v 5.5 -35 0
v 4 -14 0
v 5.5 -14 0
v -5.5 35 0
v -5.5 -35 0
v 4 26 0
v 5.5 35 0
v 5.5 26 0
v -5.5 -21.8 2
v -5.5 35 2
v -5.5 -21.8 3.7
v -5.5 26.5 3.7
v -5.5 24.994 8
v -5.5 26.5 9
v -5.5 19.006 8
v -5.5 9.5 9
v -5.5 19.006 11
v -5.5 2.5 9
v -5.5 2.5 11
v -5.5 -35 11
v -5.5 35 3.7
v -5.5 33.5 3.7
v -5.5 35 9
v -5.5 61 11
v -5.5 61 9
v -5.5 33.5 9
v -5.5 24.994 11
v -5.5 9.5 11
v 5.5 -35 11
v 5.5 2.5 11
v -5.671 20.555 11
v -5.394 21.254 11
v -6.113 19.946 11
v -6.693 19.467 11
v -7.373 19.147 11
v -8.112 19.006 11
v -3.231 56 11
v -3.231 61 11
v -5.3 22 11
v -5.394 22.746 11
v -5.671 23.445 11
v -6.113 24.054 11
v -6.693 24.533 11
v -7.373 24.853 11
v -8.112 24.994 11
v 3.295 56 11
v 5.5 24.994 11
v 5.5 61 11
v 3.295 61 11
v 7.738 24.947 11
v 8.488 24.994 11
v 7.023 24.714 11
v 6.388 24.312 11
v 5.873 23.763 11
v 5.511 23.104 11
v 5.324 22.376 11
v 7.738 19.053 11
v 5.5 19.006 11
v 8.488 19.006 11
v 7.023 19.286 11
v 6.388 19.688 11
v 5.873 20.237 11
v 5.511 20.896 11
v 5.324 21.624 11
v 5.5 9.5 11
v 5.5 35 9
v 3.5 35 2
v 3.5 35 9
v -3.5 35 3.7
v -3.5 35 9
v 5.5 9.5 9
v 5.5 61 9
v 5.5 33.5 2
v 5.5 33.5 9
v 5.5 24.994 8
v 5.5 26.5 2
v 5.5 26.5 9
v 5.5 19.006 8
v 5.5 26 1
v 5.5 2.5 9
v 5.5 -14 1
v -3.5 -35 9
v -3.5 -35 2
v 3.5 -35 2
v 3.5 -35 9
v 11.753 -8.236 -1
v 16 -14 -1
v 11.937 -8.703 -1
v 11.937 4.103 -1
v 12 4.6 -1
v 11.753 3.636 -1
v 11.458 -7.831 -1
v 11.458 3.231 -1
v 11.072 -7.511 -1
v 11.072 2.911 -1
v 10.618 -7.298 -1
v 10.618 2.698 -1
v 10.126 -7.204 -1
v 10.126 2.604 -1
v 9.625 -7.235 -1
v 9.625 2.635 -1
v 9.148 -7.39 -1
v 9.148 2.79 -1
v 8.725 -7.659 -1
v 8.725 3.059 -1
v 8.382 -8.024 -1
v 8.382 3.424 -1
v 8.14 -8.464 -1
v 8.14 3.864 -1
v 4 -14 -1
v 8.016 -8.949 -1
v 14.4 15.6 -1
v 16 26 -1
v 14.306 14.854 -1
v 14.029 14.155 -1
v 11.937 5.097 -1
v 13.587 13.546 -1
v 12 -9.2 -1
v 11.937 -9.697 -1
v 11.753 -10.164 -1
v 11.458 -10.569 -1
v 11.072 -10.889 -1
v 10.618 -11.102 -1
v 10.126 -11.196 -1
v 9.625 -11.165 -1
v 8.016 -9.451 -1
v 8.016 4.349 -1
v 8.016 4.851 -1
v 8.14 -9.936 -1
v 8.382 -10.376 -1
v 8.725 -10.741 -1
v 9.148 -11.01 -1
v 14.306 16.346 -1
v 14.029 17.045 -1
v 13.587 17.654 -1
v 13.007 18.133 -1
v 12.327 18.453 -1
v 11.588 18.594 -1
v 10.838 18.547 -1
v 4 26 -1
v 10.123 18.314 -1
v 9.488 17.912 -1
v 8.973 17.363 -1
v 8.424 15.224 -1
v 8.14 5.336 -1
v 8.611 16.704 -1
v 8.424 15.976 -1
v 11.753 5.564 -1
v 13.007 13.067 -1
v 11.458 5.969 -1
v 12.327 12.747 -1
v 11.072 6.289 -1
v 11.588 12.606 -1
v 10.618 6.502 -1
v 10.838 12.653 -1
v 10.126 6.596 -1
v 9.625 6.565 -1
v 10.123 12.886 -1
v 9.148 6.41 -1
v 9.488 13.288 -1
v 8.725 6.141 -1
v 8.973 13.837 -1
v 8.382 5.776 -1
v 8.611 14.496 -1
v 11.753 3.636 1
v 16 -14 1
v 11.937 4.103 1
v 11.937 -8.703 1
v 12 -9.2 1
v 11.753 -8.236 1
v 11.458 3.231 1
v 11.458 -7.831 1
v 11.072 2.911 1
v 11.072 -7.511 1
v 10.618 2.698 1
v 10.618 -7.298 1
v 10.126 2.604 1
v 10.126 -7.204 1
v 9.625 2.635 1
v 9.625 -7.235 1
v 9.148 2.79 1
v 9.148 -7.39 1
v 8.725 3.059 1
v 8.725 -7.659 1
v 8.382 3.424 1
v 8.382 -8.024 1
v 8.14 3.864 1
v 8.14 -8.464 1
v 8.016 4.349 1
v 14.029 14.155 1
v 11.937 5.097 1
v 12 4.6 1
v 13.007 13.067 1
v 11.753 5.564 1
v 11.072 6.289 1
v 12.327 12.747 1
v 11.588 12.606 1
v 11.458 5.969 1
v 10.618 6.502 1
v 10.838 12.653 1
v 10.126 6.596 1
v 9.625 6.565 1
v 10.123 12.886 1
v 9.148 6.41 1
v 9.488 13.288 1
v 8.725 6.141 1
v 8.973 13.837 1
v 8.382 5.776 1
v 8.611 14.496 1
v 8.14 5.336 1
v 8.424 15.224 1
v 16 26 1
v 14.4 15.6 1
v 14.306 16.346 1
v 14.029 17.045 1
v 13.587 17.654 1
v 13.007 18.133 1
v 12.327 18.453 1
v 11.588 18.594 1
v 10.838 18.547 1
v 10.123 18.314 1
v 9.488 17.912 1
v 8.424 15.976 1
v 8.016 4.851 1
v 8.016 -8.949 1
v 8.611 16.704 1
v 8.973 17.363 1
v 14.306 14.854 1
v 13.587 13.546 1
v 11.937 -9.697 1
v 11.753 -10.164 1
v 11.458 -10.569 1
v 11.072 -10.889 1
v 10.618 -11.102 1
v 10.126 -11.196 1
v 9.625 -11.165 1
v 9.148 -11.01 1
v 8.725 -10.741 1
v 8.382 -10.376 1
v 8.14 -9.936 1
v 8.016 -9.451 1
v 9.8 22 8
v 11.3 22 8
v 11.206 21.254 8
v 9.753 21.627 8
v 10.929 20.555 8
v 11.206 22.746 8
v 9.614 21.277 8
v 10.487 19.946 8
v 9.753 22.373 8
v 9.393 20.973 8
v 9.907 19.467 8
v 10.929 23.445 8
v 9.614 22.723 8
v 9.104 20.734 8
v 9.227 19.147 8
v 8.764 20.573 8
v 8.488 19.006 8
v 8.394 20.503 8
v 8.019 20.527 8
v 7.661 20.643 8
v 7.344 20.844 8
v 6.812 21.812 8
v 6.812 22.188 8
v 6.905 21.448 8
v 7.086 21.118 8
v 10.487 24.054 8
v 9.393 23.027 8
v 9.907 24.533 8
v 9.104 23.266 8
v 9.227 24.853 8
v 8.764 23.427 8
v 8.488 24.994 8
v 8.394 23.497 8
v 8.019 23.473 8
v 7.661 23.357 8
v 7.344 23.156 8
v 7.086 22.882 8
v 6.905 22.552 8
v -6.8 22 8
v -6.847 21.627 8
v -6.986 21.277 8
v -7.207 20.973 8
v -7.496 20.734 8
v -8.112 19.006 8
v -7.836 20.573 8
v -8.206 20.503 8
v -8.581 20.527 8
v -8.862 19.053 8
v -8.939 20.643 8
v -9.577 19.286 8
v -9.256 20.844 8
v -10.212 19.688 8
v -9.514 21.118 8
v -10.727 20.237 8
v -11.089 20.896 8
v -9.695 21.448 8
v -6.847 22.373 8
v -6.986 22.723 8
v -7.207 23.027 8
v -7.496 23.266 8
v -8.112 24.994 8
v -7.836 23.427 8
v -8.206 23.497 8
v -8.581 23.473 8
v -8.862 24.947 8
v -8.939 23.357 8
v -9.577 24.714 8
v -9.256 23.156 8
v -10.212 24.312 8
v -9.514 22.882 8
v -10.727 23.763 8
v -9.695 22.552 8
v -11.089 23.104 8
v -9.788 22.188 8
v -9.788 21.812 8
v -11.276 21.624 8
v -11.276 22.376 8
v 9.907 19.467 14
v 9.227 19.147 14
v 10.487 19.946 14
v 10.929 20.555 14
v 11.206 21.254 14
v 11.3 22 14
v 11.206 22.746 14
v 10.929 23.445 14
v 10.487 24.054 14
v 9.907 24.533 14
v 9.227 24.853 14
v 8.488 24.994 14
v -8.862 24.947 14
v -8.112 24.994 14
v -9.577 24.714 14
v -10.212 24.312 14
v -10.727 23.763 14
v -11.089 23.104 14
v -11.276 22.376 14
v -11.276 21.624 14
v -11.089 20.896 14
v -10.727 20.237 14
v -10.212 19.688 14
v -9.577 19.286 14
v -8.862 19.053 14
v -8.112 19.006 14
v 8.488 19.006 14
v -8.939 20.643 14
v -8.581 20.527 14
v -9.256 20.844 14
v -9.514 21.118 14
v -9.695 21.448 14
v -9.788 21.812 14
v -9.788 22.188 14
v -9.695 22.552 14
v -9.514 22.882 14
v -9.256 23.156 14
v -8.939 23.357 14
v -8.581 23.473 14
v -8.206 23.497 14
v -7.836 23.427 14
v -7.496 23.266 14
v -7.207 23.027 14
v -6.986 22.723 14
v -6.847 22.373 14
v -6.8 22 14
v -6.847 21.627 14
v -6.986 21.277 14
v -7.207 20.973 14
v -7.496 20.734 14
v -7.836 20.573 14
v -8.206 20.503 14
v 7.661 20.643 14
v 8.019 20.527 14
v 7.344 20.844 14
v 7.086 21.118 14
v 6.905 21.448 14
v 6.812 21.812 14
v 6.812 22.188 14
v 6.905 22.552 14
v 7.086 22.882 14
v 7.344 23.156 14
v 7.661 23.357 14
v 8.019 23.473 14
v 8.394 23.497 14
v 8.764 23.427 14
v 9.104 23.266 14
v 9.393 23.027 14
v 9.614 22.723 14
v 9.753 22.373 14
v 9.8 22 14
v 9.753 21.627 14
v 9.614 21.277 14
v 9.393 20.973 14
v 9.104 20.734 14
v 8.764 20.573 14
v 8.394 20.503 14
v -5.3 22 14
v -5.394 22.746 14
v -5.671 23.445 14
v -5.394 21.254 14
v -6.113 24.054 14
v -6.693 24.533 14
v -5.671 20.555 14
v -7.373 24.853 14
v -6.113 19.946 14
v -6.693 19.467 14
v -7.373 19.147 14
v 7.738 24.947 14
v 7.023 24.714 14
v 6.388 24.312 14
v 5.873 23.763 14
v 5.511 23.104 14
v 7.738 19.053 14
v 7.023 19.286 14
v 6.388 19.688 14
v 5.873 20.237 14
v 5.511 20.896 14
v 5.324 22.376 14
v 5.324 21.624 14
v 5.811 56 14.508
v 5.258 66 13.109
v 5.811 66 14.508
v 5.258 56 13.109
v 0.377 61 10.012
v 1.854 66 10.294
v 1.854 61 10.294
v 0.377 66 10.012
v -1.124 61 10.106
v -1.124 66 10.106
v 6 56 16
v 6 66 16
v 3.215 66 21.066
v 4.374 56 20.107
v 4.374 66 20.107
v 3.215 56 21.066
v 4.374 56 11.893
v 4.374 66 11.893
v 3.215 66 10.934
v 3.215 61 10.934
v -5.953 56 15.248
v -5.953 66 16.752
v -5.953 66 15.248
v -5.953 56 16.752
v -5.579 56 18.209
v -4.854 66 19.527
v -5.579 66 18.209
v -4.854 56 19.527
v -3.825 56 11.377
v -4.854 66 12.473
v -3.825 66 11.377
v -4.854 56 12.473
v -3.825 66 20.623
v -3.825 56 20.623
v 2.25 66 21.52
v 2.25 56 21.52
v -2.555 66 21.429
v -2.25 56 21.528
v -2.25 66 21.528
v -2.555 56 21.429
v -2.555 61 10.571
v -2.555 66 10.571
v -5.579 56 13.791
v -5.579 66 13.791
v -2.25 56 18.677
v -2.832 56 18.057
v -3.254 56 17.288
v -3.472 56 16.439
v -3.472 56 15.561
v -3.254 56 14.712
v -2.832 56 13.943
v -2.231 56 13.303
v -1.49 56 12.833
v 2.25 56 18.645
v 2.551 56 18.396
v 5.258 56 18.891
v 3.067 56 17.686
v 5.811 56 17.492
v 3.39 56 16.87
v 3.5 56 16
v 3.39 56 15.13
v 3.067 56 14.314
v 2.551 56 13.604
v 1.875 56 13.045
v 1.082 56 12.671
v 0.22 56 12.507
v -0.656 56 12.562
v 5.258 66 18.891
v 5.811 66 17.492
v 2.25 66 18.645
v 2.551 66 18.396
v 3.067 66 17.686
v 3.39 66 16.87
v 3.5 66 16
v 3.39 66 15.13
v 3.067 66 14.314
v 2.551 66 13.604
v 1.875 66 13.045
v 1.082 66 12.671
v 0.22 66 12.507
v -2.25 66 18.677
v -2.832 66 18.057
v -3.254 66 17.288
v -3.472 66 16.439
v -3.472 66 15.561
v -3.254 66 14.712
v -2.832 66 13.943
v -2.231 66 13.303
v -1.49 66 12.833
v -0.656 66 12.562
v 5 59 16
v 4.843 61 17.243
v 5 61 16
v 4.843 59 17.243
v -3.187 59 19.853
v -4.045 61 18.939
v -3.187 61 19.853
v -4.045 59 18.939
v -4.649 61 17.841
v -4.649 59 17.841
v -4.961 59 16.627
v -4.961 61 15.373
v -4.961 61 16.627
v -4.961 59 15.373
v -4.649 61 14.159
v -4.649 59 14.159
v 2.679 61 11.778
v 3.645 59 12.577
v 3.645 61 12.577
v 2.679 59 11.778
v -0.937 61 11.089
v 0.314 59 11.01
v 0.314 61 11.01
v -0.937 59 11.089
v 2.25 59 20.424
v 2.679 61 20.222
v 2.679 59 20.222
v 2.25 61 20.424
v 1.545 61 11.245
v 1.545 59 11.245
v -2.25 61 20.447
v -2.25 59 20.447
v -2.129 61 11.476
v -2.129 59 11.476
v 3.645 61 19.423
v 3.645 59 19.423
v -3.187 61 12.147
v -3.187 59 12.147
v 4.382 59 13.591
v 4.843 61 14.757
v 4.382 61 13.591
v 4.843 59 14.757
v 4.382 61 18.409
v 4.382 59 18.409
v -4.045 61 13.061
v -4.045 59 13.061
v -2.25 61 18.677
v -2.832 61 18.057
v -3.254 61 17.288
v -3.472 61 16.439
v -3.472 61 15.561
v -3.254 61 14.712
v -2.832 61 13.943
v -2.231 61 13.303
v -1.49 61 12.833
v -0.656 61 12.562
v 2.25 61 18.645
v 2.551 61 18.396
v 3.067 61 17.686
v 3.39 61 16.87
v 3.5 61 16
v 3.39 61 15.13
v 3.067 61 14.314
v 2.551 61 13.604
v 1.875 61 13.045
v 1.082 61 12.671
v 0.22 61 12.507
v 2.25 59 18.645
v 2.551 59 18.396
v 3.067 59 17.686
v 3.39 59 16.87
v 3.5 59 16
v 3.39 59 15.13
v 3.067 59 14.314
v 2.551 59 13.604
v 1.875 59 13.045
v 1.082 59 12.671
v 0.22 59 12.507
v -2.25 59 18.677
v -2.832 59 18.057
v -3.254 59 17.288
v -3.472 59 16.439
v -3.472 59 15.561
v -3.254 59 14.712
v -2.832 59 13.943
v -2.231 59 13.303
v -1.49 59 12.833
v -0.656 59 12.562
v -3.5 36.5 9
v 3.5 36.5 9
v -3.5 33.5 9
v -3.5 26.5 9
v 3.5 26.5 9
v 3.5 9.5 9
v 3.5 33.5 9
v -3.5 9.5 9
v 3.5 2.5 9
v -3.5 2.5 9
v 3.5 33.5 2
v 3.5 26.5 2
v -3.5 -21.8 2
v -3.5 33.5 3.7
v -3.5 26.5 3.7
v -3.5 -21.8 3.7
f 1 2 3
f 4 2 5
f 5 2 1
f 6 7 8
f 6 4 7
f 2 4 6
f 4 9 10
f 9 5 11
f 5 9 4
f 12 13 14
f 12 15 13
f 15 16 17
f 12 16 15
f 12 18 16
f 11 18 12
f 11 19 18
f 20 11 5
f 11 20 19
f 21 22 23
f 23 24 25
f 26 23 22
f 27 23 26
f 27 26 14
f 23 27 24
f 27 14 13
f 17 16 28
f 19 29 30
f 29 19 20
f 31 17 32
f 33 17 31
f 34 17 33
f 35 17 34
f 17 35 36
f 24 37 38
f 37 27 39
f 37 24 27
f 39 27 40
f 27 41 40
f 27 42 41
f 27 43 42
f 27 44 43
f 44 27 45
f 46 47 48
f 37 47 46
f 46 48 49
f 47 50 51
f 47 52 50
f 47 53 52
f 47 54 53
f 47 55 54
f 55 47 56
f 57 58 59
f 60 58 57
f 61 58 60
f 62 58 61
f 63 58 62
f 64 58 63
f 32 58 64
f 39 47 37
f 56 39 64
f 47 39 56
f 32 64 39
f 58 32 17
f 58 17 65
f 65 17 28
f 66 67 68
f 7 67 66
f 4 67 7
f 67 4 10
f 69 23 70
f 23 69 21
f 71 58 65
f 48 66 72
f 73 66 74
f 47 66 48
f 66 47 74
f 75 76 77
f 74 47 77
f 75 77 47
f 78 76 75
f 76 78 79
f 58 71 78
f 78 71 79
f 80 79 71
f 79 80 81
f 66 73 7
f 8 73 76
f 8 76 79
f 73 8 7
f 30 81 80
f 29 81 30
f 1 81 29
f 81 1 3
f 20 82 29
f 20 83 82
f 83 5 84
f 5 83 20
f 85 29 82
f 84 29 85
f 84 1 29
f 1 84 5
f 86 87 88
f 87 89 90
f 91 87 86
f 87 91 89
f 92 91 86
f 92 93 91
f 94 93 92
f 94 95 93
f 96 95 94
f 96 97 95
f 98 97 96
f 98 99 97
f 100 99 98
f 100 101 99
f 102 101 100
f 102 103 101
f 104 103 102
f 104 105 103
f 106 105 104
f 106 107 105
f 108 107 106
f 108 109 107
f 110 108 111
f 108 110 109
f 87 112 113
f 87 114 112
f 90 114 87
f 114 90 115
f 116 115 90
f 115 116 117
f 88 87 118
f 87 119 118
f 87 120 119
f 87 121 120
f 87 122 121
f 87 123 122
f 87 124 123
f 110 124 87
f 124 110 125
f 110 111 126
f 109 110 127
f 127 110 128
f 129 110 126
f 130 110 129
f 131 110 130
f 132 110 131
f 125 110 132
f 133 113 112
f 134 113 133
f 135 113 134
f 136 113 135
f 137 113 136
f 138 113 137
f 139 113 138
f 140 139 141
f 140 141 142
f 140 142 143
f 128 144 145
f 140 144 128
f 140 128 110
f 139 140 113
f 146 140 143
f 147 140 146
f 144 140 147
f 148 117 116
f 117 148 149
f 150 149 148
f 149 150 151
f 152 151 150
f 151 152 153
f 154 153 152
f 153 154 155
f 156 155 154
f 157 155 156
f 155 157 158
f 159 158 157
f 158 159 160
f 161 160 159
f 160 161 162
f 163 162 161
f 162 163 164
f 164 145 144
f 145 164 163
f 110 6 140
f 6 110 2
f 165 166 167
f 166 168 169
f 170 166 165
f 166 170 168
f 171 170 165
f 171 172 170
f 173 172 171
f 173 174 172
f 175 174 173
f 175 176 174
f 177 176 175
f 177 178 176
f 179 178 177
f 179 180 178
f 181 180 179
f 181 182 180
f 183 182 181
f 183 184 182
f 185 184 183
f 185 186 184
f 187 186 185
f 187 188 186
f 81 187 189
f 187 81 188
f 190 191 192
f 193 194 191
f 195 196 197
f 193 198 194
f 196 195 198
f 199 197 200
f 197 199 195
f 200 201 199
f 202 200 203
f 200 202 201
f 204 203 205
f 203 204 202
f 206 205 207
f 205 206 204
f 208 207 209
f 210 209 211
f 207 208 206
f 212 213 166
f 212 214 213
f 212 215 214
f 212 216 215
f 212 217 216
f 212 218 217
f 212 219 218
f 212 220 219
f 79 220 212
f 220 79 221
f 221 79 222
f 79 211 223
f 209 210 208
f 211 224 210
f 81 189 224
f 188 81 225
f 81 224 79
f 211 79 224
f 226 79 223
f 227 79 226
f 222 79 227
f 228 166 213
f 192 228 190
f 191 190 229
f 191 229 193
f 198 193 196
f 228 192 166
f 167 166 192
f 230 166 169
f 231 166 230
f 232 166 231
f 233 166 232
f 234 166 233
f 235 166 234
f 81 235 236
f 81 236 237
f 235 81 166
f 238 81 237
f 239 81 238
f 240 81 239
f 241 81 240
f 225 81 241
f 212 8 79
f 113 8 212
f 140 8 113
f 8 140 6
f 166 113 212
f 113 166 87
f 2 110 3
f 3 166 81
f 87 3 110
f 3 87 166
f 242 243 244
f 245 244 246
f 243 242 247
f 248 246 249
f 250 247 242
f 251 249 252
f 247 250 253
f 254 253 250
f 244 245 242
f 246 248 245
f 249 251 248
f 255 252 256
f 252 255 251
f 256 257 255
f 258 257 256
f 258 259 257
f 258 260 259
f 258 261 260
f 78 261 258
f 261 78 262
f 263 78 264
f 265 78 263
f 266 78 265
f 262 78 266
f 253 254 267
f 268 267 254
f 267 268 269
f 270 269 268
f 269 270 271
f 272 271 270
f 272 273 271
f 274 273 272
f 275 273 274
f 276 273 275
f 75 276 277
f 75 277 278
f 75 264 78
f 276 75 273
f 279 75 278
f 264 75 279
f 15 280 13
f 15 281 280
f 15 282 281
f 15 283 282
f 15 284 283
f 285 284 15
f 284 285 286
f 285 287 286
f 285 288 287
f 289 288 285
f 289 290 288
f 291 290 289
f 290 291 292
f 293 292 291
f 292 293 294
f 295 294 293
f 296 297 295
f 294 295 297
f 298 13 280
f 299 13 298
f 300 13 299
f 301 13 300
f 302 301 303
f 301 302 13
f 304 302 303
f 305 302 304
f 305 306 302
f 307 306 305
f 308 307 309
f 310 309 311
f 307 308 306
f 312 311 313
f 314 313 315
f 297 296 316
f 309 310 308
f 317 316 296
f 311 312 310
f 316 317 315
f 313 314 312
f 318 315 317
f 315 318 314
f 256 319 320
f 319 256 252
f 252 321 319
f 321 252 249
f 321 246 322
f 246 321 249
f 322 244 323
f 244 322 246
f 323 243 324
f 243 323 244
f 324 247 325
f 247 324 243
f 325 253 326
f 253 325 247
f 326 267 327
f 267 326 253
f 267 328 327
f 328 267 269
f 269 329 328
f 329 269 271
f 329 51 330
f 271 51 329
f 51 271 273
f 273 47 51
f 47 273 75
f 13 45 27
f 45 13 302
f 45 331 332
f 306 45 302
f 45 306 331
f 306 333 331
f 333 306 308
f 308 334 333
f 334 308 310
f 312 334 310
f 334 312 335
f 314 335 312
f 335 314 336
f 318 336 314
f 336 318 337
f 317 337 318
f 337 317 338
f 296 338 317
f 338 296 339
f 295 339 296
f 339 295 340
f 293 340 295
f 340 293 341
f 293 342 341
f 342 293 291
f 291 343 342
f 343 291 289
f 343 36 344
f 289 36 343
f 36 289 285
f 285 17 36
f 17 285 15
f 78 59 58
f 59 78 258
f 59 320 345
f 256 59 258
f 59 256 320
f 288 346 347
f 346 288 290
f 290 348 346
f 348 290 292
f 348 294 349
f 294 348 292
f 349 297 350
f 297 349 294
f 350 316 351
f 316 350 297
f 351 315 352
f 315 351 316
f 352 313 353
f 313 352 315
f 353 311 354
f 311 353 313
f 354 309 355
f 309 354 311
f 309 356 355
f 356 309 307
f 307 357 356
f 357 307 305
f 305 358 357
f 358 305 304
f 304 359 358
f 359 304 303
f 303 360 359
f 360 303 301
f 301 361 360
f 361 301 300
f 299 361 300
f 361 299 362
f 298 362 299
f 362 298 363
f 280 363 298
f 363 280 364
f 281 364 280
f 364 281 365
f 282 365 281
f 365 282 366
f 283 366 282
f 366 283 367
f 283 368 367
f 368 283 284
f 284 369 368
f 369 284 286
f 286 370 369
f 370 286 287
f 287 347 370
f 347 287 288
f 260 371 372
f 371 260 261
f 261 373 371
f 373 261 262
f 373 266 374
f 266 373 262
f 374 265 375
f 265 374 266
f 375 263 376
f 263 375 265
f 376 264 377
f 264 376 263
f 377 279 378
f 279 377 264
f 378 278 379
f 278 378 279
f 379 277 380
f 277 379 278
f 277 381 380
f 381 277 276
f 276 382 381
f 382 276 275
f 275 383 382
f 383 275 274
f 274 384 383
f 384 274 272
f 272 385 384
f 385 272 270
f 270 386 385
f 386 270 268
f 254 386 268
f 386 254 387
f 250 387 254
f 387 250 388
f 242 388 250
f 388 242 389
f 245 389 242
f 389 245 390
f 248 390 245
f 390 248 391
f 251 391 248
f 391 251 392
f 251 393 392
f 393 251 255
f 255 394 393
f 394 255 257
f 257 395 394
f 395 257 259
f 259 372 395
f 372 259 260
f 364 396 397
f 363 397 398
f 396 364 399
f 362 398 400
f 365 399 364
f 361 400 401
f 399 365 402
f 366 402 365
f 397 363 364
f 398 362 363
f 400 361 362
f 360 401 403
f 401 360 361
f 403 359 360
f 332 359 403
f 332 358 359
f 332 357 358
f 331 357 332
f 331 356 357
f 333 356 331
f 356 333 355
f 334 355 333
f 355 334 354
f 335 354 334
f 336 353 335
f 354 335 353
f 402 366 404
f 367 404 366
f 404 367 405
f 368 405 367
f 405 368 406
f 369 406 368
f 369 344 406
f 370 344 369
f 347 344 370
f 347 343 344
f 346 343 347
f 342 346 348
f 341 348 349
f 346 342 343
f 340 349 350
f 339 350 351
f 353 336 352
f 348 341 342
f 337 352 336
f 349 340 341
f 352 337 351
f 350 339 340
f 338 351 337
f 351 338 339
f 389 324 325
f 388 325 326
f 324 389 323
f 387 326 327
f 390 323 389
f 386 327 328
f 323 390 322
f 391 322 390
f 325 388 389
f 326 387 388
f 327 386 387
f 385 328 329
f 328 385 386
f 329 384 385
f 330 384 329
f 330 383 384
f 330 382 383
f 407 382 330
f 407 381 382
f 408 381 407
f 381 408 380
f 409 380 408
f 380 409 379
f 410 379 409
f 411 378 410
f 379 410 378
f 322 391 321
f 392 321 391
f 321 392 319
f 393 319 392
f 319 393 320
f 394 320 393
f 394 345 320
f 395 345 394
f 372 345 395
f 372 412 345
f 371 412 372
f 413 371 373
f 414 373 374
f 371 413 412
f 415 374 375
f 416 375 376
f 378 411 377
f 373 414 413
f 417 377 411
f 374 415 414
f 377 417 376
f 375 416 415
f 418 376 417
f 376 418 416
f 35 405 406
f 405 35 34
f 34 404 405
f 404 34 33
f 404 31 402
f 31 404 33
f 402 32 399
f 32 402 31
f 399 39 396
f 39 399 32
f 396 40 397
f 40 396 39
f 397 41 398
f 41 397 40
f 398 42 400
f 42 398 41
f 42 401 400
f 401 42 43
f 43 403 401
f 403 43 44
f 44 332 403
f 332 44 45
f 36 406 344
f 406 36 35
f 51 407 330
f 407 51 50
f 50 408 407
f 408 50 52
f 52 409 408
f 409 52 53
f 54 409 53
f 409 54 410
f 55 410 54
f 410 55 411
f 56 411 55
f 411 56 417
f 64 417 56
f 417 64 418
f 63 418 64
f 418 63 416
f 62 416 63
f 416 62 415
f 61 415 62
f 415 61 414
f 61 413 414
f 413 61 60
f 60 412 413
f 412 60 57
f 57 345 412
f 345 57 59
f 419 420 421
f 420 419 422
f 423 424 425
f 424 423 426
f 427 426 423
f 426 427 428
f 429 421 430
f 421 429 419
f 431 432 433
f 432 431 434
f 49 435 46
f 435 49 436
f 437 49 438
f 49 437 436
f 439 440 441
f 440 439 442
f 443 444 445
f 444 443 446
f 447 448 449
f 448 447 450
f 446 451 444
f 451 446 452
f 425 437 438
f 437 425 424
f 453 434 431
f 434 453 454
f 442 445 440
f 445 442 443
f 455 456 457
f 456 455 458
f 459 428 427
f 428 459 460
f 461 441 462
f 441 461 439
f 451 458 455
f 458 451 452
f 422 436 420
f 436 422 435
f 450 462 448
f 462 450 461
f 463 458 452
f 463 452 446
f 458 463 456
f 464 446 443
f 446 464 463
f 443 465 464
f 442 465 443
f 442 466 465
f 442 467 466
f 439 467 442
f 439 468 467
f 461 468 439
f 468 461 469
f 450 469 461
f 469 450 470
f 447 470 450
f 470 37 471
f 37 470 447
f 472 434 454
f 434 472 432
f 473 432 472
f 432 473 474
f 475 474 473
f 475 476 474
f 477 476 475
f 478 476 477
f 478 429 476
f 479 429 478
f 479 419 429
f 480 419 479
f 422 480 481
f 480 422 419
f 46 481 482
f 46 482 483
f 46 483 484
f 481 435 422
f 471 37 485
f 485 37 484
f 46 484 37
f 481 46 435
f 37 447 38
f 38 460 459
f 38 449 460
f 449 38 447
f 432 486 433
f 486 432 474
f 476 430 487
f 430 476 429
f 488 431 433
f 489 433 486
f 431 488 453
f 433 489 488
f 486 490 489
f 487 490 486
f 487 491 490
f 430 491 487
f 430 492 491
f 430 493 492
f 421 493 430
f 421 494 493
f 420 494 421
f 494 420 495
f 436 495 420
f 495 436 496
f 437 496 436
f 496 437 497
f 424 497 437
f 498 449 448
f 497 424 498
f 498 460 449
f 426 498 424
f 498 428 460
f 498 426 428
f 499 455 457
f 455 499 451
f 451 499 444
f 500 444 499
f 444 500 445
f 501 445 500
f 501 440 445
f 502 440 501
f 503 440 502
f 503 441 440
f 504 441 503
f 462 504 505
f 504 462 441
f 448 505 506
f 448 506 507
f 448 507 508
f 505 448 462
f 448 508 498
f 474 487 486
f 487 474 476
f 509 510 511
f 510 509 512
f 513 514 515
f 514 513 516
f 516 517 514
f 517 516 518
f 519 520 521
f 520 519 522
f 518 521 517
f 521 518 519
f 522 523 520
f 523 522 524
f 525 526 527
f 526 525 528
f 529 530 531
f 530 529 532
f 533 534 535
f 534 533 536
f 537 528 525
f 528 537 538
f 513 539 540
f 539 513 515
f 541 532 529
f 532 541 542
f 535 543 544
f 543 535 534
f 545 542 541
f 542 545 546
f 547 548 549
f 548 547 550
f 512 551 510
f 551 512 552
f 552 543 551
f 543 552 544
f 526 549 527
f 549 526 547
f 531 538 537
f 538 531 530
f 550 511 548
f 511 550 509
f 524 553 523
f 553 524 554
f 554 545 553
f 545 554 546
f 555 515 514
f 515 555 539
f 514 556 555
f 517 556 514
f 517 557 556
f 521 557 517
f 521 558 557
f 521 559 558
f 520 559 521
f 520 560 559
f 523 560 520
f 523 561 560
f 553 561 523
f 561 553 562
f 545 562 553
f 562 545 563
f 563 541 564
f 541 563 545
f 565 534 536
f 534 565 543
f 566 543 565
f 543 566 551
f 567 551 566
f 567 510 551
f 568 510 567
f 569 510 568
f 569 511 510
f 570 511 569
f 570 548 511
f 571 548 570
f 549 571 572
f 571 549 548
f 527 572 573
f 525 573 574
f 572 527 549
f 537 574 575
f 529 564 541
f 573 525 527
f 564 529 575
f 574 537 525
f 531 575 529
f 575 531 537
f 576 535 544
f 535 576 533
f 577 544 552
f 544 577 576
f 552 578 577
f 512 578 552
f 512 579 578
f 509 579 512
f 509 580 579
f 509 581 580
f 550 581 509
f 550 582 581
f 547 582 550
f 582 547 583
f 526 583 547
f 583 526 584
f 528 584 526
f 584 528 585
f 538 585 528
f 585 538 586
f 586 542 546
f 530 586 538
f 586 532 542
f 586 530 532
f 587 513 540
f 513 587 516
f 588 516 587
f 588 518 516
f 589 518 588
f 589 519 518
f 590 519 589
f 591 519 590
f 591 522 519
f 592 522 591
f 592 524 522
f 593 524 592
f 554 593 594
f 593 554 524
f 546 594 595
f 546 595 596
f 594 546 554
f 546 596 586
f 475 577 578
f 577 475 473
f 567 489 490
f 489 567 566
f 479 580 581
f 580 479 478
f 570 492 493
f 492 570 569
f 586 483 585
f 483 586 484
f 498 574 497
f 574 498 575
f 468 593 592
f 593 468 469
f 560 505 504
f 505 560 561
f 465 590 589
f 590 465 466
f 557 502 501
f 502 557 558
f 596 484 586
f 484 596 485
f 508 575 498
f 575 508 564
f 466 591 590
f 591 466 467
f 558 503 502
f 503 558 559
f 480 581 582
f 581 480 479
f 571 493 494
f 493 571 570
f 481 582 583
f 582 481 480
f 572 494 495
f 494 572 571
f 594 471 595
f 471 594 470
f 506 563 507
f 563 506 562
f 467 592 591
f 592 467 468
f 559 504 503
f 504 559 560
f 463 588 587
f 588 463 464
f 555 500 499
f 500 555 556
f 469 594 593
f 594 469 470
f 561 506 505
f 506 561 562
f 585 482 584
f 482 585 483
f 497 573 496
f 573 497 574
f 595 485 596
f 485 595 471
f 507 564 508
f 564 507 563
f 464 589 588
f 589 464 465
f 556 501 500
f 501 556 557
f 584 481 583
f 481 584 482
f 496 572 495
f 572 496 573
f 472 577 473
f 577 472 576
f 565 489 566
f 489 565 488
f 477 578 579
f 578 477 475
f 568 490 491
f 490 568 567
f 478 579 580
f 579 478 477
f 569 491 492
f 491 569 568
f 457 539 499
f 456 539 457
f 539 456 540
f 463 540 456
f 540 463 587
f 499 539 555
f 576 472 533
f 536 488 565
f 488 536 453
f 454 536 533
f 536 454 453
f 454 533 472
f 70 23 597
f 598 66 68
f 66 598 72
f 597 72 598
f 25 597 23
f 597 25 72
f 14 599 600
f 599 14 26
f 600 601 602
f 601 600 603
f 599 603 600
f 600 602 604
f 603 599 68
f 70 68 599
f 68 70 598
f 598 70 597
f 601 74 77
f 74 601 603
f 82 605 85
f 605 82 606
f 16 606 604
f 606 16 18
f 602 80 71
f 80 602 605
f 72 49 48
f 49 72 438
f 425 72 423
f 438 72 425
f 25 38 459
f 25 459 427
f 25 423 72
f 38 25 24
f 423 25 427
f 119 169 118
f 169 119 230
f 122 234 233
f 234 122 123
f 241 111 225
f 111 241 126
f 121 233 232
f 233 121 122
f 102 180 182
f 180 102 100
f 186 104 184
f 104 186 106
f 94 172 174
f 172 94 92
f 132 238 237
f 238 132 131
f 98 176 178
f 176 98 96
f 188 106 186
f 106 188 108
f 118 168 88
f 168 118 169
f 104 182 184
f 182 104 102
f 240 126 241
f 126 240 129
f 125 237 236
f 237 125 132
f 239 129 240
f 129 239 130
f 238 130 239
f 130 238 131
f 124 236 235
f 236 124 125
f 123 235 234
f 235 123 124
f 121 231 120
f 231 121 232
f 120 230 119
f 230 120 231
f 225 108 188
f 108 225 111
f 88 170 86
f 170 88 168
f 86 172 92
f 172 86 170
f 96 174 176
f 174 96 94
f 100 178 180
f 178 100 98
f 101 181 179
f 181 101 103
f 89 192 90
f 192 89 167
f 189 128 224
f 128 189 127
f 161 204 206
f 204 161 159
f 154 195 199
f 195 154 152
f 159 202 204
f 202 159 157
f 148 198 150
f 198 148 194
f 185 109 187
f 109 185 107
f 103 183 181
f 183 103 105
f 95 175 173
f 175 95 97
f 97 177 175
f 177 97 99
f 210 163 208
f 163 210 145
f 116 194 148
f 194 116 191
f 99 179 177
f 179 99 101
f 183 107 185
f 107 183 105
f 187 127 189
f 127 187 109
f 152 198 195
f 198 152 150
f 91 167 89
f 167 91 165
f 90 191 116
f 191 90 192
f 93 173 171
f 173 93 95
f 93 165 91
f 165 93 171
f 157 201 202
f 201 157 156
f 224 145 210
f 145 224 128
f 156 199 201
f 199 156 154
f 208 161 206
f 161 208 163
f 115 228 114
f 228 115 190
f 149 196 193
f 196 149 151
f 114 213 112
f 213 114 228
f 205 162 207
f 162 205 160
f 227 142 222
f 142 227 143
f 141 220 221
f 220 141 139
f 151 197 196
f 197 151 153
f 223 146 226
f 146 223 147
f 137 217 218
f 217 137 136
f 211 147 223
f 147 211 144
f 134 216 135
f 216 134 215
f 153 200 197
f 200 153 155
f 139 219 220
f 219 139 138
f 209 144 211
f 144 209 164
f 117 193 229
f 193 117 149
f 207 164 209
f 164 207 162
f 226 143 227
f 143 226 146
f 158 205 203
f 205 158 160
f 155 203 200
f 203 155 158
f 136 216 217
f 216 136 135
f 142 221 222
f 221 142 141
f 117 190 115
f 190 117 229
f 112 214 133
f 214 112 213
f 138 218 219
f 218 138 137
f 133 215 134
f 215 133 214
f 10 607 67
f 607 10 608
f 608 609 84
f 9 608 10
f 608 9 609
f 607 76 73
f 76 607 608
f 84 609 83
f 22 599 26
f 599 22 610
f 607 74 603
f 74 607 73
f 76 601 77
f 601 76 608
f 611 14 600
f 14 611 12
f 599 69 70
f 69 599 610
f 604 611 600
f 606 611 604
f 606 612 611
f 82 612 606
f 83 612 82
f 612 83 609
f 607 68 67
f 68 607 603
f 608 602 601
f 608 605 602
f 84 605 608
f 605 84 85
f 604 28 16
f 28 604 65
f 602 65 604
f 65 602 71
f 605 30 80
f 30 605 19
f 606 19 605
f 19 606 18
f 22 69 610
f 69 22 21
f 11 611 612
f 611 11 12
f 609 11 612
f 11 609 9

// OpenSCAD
$fn = 25;

wall_thickness = 2;

body_width = 11;
body_depth = 70;
body_height = 11;

big_cut_width = 11;
big_cut_depth = 7;
big_cut_height = wall_thickness;
big_cut_position_depth = 19;
big_cut_position_height = body_height - wall_thickness;

long_cut_width = 7;
long_cut_height = 7;
long_cut_depth = body_depth;

h_cut_size = [body_width+20, 7, 7];
h_cut_pos = [0, body_depth - 40, wall_thickness];

v_cut_size = [7, body_depth + 3, 7];
v_cut_pos = [0, 0, wall_thickness];

sensor_cut_size = [11.1, 7, wall_thickness + 0.1];
sensor_cut_pos = [0, body_depth - 64, body_height - wall_thickness];

suv_cut_size = [wall_thickness + 0.2, body_depth - 3, 1.7];
suv_cut_pos = [-(body_width - wall_thickness)/2, body_depth - 58.3, wall_thickness];

plate_pos = [0, body_depth - 49, 8];

holes = [
     [2, 15, [10, body_depth - 79.2, -5]],
     [2, 15, [10, body_depth - 65.4, -5]],
     [3, 15, [11.4, body_depth - 54.4, -5]],
];

mount_plate_size = [12, 40, wall_thickness];
mount_plate_pos = [10, body_depth - 64, -1];

cabel_plate_size = [body_width, 40, wall_thickness];
cabel_plate_pos = [0, plate_pos.y + cabel_plate_size.y/2, body_height - wall_thickness];

cabel_ring_size = [3.5, 5, 2, 10, 6];
cabel_ring_pos = [0, plate_pos.y + cabel_plate_size.y, body_height - wall_thickness/2 + cabel_ring_size[4]];

cabel_cut_size = 4.5;

module cut(cut_size) {
     linear_extrude(height=cut_size.z)
          square([cut_size.x, cut_size.y], center=true);
};

module body() {
     linear_extrude(height=body_height)
          square([body_width, body_depth], center=true);

     translate(mount_plate_pos)
          linear_extrude(height=mount_plate_size.z)
          square([mount_plate_size.x, mount_plate_size.y], center=true);

};


module cabel_ring() {
     rotate([90, 0, 0])
     translate([0, 0, -cabel_ring_size[3]/2])
     difference() {
          linear_extrude(height=cabel_ring_size[3])
               circle(cabel_ring_size[4], center=true);

          translate([0, 0, cabel_ring_size[3]/2])
               linear_extrude(height=cabel_ring_size[2])
               circle(cabel_ring_size.y, center=true);

          translate([0, 0, -0.1])
               linear_extrude(height=cabel_ring_size[3] + 0.2)
               circle(cabel_ring_size.x, center=true);

          translate([0, (cabel_ring_size.x + cabel_ring_size[4])/2, -2])
               linear_extrude(height=cabel_ring_size[3] + 3)
               square([cabel_cut_size, cabel_ring_size[4] - cabel_ring_size.x + 2], center=true);
     };

};

module cabel() {
     translate(cabel_plate_pos)
          linear_extrude(height=cabel_plate_size.z)
          square([cabel_plate_size.x, cabel_plate_size.y], center=true);

     translate(cabel_ring_pos)
     cabel_ring();
}

module holes() {
     for (hole = holes) {
          translate(hole.z)
               linear_extrude(height=hole.y)
               circle(hole.x, center=true);
     }
}

module corner(height) {
     linear_extrude(height=height)
          polygon([
                       [corner_cut_size, 0],
                       [0, corner_cut_size],
                       [0, 0]
                       ]);
}

module plate() {
     linear_extrude(height=3)
          difference() {
          hull() {
               translate([-8.3, 1, 0])
                    circle(r=3, center=true);

               translate([8.3, 1, 0])
                    circle(r=3, center=true);
          };
          translate([-8.3, 1, 0])
               circle(r=1.5, center=true);

          translate([8.3, 1, 0])
               circle(r=1.5, center=true);
     };
     linear_extrude(height=6)
          difference() {
          union() {
               translate([-8.3, 1, 0])
                    circle(r=3, center=true);
               translate([8.3, 1, 0])
                    circle(r=3, center=true);
          };

          translate([-8.3, 1, 0])
               circle(r=1.5, center=true);
          translate([8.3, 1, 0])
               circle(r=1.5, center=true);
     }
};

difference() {
     union() {
          body();
          translate(plate_pos)
               plate();
          cabel();
     };
     translate(h_cut_pos)
          cut(h_cut_size);
     translate(v_cut_pos)
          cut(v_cut_size);
     translate(sensor_cut_pos)
          cut(sensor_cut_size);
     translate(suv_cut_pos)
          cut(suv_cut_size);

     holes();
};
